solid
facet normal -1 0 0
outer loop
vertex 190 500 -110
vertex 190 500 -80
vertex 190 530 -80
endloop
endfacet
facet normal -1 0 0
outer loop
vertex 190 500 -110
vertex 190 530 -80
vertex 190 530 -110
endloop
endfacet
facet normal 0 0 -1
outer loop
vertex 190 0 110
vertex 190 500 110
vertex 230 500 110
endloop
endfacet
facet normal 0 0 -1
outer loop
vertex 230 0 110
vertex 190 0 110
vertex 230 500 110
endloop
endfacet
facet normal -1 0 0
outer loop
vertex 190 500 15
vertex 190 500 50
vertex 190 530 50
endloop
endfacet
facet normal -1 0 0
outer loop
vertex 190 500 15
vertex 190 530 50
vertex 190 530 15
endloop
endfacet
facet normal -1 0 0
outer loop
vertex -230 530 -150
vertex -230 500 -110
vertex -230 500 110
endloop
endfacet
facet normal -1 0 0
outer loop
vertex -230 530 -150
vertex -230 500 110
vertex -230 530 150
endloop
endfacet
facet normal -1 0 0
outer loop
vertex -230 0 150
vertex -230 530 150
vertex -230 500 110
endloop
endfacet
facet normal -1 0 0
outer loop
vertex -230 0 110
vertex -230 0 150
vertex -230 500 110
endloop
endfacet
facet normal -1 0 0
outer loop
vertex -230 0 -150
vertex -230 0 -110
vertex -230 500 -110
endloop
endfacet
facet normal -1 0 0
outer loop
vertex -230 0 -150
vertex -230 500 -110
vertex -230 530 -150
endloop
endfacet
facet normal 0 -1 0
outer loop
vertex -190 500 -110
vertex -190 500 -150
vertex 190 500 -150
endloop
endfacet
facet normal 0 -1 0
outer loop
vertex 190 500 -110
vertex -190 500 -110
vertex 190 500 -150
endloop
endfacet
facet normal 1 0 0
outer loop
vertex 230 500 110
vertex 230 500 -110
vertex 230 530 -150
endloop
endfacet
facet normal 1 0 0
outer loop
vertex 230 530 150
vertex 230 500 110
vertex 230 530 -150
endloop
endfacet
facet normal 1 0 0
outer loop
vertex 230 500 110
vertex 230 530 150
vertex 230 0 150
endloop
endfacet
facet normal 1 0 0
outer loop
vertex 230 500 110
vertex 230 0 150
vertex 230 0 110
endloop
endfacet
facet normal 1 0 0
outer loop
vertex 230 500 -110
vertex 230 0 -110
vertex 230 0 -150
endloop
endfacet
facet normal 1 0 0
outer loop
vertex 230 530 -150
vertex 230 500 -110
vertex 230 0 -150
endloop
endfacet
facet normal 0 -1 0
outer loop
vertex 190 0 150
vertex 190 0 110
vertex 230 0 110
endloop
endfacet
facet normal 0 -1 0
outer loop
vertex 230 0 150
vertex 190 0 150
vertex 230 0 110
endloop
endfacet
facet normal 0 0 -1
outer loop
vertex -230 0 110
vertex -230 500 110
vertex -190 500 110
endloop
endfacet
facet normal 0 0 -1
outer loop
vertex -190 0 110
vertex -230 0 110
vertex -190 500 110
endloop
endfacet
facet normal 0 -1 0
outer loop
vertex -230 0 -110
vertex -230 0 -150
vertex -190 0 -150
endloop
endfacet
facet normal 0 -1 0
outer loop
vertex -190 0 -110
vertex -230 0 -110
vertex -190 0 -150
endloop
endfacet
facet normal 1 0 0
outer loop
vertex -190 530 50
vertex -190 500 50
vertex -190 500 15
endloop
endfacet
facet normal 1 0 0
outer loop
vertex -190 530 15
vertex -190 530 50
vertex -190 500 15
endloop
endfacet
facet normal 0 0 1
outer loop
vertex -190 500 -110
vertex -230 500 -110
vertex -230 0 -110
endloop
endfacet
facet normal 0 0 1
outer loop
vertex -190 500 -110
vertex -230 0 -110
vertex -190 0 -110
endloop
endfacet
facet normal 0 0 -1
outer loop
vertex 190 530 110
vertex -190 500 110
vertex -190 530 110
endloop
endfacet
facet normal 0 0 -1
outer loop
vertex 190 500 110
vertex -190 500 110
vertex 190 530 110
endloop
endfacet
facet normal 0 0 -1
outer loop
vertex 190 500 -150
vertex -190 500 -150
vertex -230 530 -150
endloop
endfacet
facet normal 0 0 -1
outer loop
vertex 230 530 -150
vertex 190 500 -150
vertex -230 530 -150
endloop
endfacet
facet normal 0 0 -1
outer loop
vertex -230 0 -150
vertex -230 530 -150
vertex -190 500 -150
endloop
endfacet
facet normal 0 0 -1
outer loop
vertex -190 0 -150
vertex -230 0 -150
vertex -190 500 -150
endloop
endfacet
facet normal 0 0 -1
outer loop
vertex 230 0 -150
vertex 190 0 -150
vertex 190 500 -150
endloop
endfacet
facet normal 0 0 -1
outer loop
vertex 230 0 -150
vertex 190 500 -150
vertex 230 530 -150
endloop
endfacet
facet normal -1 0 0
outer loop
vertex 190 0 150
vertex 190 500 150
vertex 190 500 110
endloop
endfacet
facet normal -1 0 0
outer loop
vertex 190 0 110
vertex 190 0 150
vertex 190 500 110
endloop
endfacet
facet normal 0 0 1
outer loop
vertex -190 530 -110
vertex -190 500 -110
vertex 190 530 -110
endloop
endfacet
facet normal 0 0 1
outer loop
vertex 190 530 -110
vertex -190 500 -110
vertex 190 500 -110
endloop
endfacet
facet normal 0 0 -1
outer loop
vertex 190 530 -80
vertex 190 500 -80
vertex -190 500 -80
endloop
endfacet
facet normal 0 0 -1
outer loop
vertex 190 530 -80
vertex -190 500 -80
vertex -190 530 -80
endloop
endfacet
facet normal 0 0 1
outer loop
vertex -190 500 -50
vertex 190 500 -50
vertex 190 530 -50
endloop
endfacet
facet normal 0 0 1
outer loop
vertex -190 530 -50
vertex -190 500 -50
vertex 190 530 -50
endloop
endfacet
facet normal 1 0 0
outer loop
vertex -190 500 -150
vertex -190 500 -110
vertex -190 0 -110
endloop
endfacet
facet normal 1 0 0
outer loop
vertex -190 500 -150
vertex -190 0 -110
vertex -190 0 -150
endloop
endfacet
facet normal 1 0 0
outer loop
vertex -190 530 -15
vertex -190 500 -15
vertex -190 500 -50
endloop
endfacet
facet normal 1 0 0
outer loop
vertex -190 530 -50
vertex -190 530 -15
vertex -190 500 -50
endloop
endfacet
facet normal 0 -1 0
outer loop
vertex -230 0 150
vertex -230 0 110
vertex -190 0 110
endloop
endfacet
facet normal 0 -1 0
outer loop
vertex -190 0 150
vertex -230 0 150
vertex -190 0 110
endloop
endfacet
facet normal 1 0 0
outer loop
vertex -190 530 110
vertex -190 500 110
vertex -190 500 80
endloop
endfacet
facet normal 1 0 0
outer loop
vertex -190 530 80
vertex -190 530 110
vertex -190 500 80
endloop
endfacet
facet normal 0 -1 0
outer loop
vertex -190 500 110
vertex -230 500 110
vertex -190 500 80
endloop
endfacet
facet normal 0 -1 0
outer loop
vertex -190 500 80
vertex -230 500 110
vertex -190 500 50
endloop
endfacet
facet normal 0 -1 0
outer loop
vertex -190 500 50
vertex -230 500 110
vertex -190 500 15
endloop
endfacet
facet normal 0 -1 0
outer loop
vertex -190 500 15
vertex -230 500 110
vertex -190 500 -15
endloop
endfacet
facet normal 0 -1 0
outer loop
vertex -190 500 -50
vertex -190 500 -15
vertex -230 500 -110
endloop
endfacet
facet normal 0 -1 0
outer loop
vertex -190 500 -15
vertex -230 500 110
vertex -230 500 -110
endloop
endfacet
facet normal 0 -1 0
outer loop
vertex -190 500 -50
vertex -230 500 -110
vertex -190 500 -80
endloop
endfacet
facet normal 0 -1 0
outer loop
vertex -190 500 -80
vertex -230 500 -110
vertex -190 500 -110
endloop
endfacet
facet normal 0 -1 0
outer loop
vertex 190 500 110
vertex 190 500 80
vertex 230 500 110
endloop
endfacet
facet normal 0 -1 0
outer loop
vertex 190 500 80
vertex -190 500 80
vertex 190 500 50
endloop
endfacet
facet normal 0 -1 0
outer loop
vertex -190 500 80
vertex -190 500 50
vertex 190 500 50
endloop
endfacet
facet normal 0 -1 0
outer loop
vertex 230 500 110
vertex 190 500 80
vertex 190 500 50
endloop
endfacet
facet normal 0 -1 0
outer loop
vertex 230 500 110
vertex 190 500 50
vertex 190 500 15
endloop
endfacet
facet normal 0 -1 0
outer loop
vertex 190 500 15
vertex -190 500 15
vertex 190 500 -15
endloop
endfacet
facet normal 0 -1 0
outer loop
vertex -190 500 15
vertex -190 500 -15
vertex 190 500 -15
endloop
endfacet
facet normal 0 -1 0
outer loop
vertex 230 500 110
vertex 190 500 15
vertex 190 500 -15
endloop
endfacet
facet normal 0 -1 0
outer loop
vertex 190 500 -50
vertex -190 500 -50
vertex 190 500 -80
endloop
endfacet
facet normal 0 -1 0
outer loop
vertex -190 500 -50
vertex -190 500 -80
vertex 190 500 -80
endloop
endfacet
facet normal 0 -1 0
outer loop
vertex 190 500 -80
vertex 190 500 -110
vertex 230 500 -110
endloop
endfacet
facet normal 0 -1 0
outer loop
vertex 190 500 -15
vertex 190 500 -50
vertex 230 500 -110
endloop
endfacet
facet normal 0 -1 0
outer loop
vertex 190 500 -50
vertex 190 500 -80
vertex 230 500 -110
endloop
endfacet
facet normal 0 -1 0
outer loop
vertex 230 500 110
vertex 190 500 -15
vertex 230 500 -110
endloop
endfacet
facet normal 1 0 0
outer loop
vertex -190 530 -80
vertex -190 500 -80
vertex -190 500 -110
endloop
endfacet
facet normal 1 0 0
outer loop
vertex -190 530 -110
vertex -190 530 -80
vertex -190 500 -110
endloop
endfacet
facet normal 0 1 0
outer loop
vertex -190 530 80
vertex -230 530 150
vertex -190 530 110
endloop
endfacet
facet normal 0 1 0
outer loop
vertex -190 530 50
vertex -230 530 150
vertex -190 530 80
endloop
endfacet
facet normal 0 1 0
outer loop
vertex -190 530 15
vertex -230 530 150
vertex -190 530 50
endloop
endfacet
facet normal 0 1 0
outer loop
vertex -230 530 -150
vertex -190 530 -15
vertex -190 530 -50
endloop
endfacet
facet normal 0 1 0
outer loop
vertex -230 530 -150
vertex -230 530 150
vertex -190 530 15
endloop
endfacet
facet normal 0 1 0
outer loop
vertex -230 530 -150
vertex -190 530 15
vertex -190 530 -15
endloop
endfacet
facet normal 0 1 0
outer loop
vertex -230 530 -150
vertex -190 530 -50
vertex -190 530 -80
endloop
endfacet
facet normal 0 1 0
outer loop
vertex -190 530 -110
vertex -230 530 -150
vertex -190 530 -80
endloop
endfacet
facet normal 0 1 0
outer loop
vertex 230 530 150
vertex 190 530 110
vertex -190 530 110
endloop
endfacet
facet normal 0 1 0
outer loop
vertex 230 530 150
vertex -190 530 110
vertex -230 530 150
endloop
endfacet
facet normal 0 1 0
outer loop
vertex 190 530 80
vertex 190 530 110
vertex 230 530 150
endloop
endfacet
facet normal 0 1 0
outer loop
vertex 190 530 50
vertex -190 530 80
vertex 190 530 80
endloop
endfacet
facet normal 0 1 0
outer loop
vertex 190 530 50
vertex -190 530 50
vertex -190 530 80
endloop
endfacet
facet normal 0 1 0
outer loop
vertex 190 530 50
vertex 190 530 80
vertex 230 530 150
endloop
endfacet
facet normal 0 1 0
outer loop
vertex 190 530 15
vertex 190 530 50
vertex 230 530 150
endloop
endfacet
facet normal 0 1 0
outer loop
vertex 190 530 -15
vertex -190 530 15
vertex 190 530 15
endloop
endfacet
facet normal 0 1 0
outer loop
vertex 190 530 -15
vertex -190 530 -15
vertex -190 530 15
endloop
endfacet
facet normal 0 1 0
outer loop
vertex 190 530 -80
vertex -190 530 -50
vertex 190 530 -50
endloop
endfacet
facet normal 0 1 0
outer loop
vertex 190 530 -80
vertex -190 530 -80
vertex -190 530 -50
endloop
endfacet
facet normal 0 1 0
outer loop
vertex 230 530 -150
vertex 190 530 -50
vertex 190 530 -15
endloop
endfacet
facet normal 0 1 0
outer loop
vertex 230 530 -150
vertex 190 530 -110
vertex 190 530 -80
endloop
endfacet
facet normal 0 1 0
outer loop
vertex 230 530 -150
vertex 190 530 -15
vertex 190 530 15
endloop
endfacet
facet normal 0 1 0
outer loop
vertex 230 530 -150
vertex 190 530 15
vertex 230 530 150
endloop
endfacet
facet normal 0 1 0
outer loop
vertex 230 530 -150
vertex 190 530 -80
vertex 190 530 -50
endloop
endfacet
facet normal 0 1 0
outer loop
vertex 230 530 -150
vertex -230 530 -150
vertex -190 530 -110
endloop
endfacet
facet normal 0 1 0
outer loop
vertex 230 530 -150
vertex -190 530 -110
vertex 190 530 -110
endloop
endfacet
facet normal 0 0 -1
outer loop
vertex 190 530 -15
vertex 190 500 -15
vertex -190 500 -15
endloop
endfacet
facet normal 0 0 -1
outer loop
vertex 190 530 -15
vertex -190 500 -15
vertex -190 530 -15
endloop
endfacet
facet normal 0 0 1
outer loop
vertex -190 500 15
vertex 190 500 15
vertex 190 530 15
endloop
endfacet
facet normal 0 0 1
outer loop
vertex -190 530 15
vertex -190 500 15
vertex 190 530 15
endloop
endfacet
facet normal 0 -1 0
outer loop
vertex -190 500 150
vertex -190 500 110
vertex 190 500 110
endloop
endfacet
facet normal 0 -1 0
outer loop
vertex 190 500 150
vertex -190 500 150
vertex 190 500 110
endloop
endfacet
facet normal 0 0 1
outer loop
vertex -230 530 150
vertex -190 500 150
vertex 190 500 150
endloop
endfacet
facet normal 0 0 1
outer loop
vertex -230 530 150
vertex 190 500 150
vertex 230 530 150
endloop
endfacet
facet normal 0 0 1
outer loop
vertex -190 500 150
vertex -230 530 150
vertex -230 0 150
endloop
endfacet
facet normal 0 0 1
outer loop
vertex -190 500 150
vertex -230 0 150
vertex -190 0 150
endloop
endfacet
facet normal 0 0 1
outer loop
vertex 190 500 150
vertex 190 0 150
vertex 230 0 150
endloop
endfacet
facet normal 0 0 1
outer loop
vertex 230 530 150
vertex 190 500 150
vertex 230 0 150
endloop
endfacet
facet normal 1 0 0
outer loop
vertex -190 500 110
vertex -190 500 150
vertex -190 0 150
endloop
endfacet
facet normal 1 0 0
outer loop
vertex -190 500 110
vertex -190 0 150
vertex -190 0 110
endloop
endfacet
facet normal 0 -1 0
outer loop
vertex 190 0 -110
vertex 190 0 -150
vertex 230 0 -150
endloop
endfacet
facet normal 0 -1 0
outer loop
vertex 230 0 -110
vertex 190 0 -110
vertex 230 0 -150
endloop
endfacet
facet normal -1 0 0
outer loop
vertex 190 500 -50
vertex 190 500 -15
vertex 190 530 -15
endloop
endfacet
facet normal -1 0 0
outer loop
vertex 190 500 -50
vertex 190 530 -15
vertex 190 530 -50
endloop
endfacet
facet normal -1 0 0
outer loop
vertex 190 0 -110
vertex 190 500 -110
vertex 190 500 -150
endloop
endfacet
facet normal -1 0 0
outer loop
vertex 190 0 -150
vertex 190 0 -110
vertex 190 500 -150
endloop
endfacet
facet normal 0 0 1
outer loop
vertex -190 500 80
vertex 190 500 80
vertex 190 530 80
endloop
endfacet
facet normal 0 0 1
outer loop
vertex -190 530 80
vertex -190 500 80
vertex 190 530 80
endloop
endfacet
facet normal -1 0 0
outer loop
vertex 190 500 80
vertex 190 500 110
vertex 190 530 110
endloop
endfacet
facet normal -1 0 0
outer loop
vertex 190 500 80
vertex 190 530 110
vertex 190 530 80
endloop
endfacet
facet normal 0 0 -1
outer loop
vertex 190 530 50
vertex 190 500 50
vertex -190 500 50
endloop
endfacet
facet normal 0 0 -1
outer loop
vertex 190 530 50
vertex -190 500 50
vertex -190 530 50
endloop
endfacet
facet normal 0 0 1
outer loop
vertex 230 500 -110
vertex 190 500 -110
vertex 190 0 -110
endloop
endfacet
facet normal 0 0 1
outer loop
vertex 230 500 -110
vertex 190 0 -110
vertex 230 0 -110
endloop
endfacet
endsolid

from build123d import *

# Parameters (mm, degrees)
SKETCH1_W             = 40
SKETCH1_H             = 40
BOSS_EXTRUDE1_DEPTH   = 500
BOSS_EXTRUDE1_2_DEPTH = 500
BOSS_EXTRUDE1_3_DEPTH = 500
BOSS_EXTRUDE1_4_DEPTH = 500
SKETCH2_W             = 460
SKETCH2_H             = 300
SKETCH2_W_2           = 380
SKETCH2_H_2           = 220
BOSS_EXTRUDE2_DEPTH   = 30
BOSS_EXTRUDE4_REACH   = 694.676
SKETCH4_W             = 30
SKETCH4_H             = 30


with BuildPart() as part:
    # Sketch1 → Boss-Extrude1 (new body)
    with BuildSketch(Plane(origin=(0, 0, 0), x_dir=(1, 0, 0), z_dir=(0, 1, 0))):
        with Locations((-210, 130)):
            Rectangle(SKETCH1_W, SKETCH1_H)
    extrude(amount=BOSS_EXTRUDE1_DEPTH)



with BuildPart() as body_2:
    # Sketch1 → Boss-Extrude1 2 (new body)
    with BuildSketch(Plane(origin=(0, 0, 0), x_dir=(1, 0, 0), z_dir=(0, 1, 0))):
        with Locations((-210, -130)):
            Rectangle(SKETCH1_W, SKETCH1_H)
    extrude(amount=BOSS_EXTRUDE1_2_DEPTH)


with BuildPart() as body_3:
    # Sketch1 → Boss-Extrude1 3 (new body)
    with BuildSketch(Plane(origin=(0, 0, 0), x_dir=(1, 0, 0), z_dir=(0, 1, 0))):
        with Locations((210, -130)):
            Rectangle(SKETCH1_W, SKETCH1_H)
    extrude(amount=BOSS_EXTRUDE1_3_DEPTH)


with BuildPart() as body_4:
    # Sketch1 → Boss-Extrude1 4 (new body)
    with BuildSketch(Plane(origin=(0, 0, 0), x_dir=(1, 0, 0), z_dir=(0, 1, 0))):
        with Locations((210, 130)):
            Rectangle(SKETCH1_W, SKETCH1_H)
    extrude(amount=BOSS_EXTRUDE1_4_DEPTH)


with BuildPart() as part_1:
    add(part.part)

    add(body_2.part)  # Boss-Extrude2 merges body 2

    add(body_3.part)  # Boss-Extrude2 merges body 3

    add(body_4.part)  # Boss-Extrude2 merges body 4
    # Sketch2 → Boss-Extrude2 (add)
    with BuildSketch(Plane(origin=(0, 500, 0), x_dir=(1, 0, 0), z_dir=(0, 1, 0))):
        Rectangle(SKETCH2_W, SKETCH2_H)
        Rectangle(SKETCH2_W_2, SKETCH2_H_2, mode=Mode.SUBTRACT)
    extrude(amount=BOSS_EXTRUDE2_DEPTH)

    # Sketch4 → Boss-Extrude4 (add, up to next)
    with BuildSketch(Plane(origin=(-190, 0, 0), x_dir=(0, 0, -1), z_dir=(1, 0, 0)), mode=Mode.PRIVATE) as boss_extrude4_sk1:
        with Locations((-65, 515)):
            Rectangle(SKETCH4_W, SKETCH4_H)
    boss_extrude4_tool1 = extrude(boss_extrude4_sk1.sketch, amount=BOSS_EXTRUDE4_REACH, mode=Mode.PRIVATE) - part_1.part
    # Sketch4 → Boss-Extrude4 (add, up to next)
    with BuildSketch(Plane(origin=(-190, 0, 0), x_dir=(0, 0, -1), z_dir=(1, 0, 0)), mode=Mode.PRIVATE) as boss_extrude4_sk2:
        with Locations((0, 515)):
            Rectangle(SKETCH4_W, SKETCH4_H)
    boss_extrude4_tool2 = extrude(boss_extrude4_sk2.sketch, amount=BOSS_EXTRUDE4_REACH, mode=Mode.PRIVATE) - part_1.part
    # Sketch4 → Boss-Extrude4 (add, up to next)
    with BuildSketch(Plane(origin=(-190, 0, 0), x_dir=(0, 0, -1), z_dir=(1, 0, 0)), mode=Mode.PRIVATE) as boss_extrude4_sk3:
        with Locations((65, 515)):
            Rectangle(SKETCH4_W, SKETCH4_H)
    boss_extrude4_tool3 = extrude(boss_extrude4_sk3.sketch, amount=BOSS_EXTRUDE4_REACH, mode=Mode.PRIVATE) - part_1.part
    add(boss_extrude4_tool1.solids().sort_by_distance((-190, 515, 65))[0])
    add(boss_extrude4_tool2.solids().sort_by_distance((-190, 515, 0))[0])
    add(boss_extrude4_tool3.solids().sort_by_distance((-190, 515, -65))[0])


solid = part_1.part
